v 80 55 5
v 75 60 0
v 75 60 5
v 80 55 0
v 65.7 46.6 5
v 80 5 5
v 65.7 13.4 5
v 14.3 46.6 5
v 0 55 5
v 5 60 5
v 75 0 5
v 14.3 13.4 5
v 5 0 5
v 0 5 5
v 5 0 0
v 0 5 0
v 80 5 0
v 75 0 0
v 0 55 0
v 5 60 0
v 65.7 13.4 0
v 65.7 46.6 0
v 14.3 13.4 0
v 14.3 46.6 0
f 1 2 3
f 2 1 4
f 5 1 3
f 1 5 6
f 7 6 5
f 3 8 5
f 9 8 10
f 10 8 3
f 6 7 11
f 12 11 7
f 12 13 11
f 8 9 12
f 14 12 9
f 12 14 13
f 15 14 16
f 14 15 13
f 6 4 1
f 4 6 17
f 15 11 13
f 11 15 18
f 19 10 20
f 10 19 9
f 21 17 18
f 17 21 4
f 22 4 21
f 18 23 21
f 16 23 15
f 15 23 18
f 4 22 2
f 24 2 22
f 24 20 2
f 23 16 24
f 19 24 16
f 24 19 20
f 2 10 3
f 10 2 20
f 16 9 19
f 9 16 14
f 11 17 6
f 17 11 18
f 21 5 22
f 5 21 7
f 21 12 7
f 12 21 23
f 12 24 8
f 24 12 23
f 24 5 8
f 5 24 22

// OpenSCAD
$fn = 32;

// ----------------------------------------------------------------------
// Windowed plate: 1 voids, 80 x 60 x 5 mm
// ----------------------------------------------------------------------

// --- parameters (mm) ---
plate_l = 80;             // plate length, X
plate_w = 60;             // plate width, Y
plate_t = 5;              // plate thickness, Z
edge_margin = 8;          // wall from the plate edge to any window
win1_l = 51.4;            // window length
win1_w = 33.2;            // window width
depth_1 = 5;              // depth of void 1 (full thickness = through)
corner_c = 5;             // corner chamfer of the plate

profile = [[5, 0], [75, 0], [80, 5], [80, 55], [75, 60], [5, 60], [0, 55], [0, 5]];  // primary outline, 8 points, counter clockwise
void_1 = [[14.3, 13.4], [65.7, 13.4], [65.7, 46.6], [14.3, 46.6]];  // large central window, 4 points

// --- the one profile operation ---
difference() {
  linear_extrude(height = plate_t) polygon(points = profile);
  translate([0, 0, -1])
    linear_extrude(height = plate_t + 2) polygon(points = void_1);
}
